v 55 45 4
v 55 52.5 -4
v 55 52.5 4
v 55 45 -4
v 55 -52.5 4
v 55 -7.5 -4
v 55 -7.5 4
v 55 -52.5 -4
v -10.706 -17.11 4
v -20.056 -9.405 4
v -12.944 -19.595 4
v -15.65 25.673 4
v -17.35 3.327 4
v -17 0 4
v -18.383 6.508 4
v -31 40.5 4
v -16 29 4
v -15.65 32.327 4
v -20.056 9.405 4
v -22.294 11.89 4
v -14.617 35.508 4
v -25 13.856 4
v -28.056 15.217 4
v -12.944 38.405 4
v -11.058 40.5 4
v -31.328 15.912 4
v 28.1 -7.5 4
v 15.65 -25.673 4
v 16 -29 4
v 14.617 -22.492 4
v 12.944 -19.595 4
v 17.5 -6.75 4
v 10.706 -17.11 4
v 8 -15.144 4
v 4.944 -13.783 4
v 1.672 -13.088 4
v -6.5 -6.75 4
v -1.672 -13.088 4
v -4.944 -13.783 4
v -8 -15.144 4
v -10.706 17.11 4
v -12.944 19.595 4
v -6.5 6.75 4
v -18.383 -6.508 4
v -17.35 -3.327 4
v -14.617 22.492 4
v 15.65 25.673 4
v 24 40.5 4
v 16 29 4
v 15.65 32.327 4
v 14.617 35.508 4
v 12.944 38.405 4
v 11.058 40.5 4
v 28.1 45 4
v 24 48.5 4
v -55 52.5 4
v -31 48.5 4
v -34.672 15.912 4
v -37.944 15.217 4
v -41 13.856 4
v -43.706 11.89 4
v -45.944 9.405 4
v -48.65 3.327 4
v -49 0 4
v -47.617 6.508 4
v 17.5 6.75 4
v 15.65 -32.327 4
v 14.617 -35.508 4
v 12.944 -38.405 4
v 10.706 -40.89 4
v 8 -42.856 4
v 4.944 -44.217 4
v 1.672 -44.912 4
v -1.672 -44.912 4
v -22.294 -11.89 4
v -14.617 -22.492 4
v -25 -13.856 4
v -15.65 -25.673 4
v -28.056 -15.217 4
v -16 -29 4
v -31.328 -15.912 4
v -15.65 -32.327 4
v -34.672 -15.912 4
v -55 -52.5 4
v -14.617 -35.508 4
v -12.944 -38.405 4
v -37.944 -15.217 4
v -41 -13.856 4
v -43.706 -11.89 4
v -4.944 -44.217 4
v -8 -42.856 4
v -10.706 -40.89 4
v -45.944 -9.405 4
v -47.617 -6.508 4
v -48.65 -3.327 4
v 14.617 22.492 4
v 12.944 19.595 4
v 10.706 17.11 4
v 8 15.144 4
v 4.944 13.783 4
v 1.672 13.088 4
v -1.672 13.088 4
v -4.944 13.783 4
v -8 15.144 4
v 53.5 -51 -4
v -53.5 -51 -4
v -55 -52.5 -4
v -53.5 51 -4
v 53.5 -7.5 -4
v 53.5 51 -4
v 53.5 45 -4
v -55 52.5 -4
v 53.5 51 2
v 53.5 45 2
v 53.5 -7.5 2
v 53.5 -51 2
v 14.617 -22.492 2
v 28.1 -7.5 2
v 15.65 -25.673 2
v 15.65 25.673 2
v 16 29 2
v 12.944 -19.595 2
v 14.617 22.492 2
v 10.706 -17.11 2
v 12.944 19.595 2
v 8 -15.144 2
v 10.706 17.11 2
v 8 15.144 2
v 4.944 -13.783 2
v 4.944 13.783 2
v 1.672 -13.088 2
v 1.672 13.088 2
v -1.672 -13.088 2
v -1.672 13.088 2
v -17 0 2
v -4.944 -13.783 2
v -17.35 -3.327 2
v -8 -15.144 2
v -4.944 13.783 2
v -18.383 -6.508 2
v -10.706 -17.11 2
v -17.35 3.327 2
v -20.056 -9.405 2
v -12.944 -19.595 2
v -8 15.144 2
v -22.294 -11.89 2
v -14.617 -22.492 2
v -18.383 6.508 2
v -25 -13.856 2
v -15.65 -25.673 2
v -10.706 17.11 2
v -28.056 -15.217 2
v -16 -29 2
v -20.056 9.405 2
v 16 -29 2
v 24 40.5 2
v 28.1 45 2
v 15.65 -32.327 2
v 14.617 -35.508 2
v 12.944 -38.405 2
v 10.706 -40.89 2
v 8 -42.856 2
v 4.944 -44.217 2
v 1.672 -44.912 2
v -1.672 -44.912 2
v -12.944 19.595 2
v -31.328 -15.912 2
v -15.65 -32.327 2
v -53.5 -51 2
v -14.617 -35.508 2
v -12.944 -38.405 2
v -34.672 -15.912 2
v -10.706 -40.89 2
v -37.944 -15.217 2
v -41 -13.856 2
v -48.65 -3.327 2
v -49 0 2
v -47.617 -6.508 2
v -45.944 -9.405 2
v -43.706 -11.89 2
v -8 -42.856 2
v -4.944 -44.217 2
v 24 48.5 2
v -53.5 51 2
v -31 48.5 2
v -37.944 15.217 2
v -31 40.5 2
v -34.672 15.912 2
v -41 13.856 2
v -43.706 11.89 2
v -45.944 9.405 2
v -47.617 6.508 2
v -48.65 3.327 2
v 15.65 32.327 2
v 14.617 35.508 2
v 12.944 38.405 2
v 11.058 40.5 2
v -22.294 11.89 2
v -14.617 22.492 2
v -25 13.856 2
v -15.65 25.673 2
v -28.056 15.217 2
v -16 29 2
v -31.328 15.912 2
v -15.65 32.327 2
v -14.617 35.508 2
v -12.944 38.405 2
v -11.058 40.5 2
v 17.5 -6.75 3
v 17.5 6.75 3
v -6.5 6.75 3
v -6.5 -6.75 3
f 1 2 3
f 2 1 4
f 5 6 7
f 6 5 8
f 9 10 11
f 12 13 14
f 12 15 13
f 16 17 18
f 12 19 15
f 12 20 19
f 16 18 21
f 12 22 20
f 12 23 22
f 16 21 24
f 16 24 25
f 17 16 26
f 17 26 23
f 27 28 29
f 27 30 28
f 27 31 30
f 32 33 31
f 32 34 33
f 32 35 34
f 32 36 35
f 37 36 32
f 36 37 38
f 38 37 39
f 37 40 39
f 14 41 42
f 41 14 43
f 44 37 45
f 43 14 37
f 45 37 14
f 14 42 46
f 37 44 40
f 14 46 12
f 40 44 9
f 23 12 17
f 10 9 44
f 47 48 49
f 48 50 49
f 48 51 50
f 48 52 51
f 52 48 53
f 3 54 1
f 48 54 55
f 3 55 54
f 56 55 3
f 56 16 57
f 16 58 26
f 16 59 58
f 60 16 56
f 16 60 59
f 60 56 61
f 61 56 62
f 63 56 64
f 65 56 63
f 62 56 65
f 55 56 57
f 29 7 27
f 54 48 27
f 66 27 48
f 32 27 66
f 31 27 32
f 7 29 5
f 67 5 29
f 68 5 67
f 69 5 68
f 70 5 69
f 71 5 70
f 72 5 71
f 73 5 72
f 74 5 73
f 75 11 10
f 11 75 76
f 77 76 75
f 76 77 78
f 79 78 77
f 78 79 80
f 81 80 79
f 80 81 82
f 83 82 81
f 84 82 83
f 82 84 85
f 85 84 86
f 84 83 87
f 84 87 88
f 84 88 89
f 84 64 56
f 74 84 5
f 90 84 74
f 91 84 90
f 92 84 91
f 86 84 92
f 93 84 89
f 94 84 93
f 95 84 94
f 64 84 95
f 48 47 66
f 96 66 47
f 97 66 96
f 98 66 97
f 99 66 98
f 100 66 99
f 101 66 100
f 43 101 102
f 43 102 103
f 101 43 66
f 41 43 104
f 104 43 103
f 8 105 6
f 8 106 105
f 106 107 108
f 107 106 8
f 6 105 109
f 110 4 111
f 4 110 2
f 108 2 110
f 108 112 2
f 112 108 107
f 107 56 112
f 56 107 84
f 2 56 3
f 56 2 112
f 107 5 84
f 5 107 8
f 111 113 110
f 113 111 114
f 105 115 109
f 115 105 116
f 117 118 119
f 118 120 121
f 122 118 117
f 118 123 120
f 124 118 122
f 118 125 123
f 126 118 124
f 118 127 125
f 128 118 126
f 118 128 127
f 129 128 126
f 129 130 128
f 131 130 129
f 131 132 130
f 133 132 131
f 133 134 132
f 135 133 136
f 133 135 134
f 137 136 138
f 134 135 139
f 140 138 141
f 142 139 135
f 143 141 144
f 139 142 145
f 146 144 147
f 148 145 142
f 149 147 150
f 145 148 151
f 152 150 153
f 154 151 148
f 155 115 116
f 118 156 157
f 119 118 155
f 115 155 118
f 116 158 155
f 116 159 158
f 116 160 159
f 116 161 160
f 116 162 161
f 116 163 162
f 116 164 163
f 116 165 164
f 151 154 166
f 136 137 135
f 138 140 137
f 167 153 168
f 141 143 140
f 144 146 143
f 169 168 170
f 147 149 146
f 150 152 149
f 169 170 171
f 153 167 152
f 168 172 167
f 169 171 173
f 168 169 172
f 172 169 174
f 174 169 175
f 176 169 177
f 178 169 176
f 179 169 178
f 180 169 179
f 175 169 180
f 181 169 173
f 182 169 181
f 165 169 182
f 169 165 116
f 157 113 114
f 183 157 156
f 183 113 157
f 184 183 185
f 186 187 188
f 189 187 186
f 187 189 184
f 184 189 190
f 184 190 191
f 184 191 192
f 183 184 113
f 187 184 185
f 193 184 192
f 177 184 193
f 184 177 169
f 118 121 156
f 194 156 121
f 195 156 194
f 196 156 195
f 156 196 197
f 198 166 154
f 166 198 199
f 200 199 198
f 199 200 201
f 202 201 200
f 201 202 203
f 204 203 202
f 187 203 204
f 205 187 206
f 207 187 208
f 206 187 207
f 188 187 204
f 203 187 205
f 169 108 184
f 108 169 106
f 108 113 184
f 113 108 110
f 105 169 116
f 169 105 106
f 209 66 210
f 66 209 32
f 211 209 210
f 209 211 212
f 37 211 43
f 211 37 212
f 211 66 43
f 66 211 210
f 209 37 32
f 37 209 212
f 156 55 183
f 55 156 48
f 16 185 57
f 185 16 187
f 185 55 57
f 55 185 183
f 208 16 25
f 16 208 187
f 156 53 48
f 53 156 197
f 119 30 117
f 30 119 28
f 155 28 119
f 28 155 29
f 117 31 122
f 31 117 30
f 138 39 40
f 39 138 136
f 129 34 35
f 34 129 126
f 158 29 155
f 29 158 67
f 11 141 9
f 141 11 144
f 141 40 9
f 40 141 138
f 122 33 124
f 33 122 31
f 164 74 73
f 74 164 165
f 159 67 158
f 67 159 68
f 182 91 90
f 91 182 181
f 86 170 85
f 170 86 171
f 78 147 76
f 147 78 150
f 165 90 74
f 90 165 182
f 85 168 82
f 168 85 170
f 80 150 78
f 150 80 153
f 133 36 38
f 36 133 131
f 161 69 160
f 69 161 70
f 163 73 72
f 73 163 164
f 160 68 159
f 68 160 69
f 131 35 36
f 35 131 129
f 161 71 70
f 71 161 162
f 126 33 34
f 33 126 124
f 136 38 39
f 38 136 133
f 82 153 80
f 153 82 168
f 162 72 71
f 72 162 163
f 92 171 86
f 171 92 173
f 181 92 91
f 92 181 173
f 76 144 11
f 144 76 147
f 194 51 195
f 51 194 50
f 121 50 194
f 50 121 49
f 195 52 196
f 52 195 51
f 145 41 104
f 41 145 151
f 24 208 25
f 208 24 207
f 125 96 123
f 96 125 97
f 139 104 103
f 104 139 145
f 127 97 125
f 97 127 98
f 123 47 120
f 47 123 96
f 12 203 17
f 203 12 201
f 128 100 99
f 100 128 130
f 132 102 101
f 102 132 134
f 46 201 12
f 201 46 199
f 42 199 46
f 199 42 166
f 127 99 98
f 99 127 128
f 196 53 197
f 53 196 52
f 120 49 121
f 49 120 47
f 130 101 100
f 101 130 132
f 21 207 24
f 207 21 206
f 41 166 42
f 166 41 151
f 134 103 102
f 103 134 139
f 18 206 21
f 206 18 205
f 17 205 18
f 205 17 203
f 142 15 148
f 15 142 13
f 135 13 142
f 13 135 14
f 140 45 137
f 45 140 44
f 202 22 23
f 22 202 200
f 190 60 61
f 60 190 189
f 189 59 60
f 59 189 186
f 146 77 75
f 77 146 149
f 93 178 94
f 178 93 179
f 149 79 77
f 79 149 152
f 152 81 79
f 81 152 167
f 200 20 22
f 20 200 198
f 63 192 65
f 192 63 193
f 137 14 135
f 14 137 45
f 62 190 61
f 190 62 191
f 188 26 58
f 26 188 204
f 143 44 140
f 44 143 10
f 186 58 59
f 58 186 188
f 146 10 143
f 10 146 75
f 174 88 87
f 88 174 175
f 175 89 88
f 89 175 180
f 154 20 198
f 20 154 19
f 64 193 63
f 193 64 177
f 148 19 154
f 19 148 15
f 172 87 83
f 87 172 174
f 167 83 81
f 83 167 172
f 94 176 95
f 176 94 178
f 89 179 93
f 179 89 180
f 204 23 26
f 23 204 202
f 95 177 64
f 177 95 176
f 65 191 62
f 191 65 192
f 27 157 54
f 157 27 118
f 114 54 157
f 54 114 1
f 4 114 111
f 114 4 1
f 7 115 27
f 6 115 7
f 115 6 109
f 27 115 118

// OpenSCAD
pi_x = 85;
pi_y = 56;
pi_z = 13;

x_clearance = 1;
y_clearance = 1;

wall_thickness = 1.5;

x_buffer = 15;
y_buffer = 15;

usb_buffer = 24;

floor_z = 1;

usb_y = 15;

ethernet_y = 20;

middle_x = pi_x+x_buffer + (wall_thickness + x_clearance) * 4;
middle_x_hole = pi_x+x_buffer + (wall_thickness + x_clearance*2) * 2;

middle_y = pi_y+ usb_buffer + y_buffer + (y_clearance + wall_thickness)*4;
middle_y_hole = pi_y+ usb_buffer + y_buffer + (y_clearance * 2 + wall_thickness)*2;

middle_z = 8;

servo_x = 23;
servo_y = 12.5;
servo_z = 1.5;

servo_x_offset = servo_x/2 - 6;

servo_x_clearance = 0.5;
servo_y_clearance = 0.5;

gpio_hole_x = 55;
gpio_hole_y = 8;


difference(){
 cube([middle_x, middle_y, middle_z], center=true);
 translate([0,0,-2])
 cube([middle_x_hole, middle_y_hole, middle_z], center=true);
    
    translate([servo_x_offset,0,middle_z/2-1 + servo_z/2])
    cube([
        servo_x + servo_x_clearance *2,
        servo_y + servo_y_clearance *2,
        servo_z
    ], center=true);

   translate([
    -(wall_thickness+x_clearance) - gpio_hole_x/2 + middle_x_hole/2 - 27,
    -(wall_thickness+y_clearance) - gpio_hole_y/2 + middle_y_hole/2,
    0
    ])
    cube([gpio_hole_x, gpio_hole_y, 10], center=true);

    translate([0,-29,0])
    cylinder(r=16, 10, center=true);
    
     translate([0,29,0])
    cylinder(r=16, 10, center=true);
   
    
    translate([-33,0,0])
    cylinder(r=16, 10, center=true);

    translate([(pi_x+x_buffer + x_clearance)/2+wall_thickness-10.4,
    (pi_y + usb_buffer + y_buffer)/2 - y_clearance - 9
    ,pi_z/2+1])
    cube([27, usb_y, pi_z+15],center=true);

    translate([(pi_x+x_buffer + x_clearance)/2+wall_thickness-10.4,
    (pi_y + usb_buffer + y_buffer)/2 - y_clearance - 28 
    ,pi_z/2+1])
    cube([27, usb_y+10, pi_z+15],center=true);

    translate([(pi_x+x_buffer + x_clearance)/2+wall_thickness -10.4,
    (pi_y + usb_buffer + y_buffer)/2 - y_clearance - 44 
    ,(pi_z+2)/2])
    cube([27, ethernet_y, pi_z+15],center=true);


}
